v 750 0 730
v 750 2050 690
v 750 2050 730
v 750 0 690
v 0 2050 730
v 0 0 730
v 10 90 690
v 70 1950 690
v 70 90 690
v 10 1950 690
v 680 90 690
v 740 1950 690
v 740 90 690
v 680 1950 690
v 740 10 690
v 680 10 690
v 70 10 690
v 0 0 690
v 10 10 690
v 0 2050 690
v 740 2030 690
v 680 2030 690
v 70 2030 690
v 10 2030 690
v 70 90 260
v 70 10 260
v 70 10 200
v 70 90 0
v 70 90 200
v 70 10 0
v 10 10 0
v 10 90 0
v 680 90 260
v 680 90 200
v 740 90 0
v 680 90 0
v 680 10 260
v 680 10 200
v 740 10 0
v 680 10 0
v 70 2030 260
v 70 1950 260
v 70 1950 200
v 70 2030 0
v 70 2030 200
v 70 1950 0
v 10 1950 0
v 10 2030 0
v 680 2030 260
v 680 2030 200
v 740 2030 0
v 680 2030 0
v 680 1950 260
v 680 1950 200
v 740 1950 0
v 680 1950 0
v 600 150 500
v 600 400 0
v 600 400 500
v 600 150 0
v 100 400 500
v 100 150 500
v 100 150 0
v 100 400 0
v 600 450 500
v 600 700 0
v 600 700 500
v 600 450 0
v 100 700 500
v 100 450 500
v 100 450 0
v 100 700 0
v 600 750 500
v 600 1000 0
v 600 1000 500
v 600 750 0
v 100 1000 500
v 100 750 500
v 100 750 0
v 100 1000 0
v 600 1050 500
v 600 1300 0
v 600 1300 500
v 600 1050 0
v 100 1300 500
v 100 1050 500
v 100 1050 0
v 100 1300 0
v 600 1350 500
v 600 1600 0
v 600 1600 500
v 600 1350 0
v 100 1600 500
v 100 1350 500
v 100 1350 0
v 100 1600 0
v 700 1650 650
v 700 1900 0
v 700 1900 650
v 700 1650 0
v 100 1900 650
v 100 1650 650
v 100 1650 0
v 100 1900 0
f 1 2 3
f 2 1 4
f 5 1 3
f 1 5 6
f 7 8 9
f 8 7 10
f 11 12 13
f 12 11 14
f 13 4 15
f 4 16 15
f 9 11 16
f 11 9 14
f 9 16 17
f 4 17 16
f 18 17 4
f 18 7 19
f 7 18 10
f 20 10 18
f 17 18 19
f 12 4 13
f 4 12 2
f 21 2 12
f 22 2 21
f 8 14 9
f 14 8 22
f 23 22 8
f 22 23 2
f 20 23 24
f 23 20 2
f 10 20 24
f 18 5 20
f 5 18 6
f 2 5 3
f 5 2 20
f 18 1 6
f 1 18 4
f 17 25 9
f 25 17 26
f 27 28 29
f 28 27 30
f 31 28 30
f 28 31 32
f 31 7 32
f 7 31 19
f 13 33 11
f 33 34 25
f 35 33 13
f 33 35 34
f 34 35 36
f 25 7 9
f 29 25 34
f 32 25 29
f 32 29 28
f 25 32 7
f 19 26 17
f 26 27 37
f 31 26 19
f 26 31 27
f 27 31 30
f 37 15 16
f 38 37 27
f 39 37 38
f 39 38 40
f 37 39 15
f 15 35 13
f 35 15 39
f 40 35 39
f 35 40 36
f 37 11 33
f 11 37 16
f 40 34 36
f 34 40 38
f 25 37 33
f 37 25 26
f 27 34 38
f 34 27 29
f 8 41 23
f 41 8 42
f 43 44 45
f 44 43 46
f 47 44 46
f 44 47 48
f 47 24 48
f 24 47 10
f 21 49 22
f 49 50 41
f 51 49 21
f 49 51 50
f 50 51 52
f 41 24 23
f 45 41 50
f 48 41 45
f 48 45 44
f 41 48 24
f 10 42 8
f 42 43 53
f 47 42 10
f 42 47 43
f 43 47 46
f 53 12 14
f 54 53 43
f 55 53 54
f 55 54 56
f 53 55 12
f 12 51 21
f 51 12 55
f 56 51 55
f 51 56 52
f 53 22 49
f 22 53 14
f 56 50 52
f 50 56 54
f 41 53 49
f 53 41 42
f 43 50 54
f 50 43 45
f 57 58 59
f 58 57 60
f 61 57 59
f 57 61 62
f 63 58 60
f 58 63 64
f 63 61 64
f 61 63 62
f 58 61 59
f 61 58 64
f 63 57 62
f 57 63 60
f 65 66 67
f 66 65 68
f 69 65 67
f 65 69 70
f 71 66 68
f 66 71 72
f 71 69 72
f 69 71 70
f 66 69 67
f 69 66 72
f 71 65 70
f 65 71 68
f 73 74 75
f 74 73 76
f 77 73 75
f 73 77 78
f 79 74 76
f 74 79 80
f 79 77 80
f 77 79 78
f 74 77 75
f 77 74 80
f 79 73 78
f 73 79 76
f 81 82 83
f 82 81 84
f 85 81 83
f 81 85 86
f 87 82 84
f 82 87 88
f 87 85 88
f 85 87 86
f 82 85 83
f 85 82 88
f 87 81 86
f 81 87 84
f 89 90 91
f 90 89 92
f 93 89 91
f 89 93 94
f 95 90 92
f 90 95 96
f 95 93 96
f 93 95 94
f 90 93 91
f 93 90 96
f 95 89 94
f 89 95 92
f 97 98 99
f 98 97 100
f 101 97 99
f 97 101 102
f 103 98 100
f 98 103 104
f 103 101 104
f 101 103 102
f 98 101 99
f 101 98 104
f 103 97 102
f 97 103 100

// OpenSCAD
// top
translate([0, 0, 690])
    color("White")
    cube([750, 2050 , 40]);

// legs
translate([10, 10, 0])
    color("White")
    cube([60, 80 , 690]);
    
translate([680, 10, 0])
    color("White")
    cube([60, 80 , 690]);
    
translate([10, 10, 200])
    color("White")
    cube([700, 80, 60]);
    
translate([10, 1950, 0])
    color("White")
    cube([60, 80, 690]);
    
translate([680, 1950, 0])
    color("White")
    cube([60, 80, 690]);
    
translate([10, 1950, 200])
    color("White")
    cube([700, 80, 60]);
    
// standalone

translate([100, 150, 0]){
    color("Black")
    cube([500, 250, 500]);
}
translate([100, 450, 0]){
    color("Black")
    cube([500, 250, 500]);
}
translate([100, 750, 0]){
    color("Black")
    cube([500, 250, 500]);
}
translate([100, 1050, 0]){
    color("Black")
    cube([500, 250, 500]);
}
translate([100, 1350, 0]){
    color("Black")
    cube([500, 250, 500]);
}
translate([100, 1650, 0]){
    color("Goldenrod")
    cube([600, 250, 650]);
}
